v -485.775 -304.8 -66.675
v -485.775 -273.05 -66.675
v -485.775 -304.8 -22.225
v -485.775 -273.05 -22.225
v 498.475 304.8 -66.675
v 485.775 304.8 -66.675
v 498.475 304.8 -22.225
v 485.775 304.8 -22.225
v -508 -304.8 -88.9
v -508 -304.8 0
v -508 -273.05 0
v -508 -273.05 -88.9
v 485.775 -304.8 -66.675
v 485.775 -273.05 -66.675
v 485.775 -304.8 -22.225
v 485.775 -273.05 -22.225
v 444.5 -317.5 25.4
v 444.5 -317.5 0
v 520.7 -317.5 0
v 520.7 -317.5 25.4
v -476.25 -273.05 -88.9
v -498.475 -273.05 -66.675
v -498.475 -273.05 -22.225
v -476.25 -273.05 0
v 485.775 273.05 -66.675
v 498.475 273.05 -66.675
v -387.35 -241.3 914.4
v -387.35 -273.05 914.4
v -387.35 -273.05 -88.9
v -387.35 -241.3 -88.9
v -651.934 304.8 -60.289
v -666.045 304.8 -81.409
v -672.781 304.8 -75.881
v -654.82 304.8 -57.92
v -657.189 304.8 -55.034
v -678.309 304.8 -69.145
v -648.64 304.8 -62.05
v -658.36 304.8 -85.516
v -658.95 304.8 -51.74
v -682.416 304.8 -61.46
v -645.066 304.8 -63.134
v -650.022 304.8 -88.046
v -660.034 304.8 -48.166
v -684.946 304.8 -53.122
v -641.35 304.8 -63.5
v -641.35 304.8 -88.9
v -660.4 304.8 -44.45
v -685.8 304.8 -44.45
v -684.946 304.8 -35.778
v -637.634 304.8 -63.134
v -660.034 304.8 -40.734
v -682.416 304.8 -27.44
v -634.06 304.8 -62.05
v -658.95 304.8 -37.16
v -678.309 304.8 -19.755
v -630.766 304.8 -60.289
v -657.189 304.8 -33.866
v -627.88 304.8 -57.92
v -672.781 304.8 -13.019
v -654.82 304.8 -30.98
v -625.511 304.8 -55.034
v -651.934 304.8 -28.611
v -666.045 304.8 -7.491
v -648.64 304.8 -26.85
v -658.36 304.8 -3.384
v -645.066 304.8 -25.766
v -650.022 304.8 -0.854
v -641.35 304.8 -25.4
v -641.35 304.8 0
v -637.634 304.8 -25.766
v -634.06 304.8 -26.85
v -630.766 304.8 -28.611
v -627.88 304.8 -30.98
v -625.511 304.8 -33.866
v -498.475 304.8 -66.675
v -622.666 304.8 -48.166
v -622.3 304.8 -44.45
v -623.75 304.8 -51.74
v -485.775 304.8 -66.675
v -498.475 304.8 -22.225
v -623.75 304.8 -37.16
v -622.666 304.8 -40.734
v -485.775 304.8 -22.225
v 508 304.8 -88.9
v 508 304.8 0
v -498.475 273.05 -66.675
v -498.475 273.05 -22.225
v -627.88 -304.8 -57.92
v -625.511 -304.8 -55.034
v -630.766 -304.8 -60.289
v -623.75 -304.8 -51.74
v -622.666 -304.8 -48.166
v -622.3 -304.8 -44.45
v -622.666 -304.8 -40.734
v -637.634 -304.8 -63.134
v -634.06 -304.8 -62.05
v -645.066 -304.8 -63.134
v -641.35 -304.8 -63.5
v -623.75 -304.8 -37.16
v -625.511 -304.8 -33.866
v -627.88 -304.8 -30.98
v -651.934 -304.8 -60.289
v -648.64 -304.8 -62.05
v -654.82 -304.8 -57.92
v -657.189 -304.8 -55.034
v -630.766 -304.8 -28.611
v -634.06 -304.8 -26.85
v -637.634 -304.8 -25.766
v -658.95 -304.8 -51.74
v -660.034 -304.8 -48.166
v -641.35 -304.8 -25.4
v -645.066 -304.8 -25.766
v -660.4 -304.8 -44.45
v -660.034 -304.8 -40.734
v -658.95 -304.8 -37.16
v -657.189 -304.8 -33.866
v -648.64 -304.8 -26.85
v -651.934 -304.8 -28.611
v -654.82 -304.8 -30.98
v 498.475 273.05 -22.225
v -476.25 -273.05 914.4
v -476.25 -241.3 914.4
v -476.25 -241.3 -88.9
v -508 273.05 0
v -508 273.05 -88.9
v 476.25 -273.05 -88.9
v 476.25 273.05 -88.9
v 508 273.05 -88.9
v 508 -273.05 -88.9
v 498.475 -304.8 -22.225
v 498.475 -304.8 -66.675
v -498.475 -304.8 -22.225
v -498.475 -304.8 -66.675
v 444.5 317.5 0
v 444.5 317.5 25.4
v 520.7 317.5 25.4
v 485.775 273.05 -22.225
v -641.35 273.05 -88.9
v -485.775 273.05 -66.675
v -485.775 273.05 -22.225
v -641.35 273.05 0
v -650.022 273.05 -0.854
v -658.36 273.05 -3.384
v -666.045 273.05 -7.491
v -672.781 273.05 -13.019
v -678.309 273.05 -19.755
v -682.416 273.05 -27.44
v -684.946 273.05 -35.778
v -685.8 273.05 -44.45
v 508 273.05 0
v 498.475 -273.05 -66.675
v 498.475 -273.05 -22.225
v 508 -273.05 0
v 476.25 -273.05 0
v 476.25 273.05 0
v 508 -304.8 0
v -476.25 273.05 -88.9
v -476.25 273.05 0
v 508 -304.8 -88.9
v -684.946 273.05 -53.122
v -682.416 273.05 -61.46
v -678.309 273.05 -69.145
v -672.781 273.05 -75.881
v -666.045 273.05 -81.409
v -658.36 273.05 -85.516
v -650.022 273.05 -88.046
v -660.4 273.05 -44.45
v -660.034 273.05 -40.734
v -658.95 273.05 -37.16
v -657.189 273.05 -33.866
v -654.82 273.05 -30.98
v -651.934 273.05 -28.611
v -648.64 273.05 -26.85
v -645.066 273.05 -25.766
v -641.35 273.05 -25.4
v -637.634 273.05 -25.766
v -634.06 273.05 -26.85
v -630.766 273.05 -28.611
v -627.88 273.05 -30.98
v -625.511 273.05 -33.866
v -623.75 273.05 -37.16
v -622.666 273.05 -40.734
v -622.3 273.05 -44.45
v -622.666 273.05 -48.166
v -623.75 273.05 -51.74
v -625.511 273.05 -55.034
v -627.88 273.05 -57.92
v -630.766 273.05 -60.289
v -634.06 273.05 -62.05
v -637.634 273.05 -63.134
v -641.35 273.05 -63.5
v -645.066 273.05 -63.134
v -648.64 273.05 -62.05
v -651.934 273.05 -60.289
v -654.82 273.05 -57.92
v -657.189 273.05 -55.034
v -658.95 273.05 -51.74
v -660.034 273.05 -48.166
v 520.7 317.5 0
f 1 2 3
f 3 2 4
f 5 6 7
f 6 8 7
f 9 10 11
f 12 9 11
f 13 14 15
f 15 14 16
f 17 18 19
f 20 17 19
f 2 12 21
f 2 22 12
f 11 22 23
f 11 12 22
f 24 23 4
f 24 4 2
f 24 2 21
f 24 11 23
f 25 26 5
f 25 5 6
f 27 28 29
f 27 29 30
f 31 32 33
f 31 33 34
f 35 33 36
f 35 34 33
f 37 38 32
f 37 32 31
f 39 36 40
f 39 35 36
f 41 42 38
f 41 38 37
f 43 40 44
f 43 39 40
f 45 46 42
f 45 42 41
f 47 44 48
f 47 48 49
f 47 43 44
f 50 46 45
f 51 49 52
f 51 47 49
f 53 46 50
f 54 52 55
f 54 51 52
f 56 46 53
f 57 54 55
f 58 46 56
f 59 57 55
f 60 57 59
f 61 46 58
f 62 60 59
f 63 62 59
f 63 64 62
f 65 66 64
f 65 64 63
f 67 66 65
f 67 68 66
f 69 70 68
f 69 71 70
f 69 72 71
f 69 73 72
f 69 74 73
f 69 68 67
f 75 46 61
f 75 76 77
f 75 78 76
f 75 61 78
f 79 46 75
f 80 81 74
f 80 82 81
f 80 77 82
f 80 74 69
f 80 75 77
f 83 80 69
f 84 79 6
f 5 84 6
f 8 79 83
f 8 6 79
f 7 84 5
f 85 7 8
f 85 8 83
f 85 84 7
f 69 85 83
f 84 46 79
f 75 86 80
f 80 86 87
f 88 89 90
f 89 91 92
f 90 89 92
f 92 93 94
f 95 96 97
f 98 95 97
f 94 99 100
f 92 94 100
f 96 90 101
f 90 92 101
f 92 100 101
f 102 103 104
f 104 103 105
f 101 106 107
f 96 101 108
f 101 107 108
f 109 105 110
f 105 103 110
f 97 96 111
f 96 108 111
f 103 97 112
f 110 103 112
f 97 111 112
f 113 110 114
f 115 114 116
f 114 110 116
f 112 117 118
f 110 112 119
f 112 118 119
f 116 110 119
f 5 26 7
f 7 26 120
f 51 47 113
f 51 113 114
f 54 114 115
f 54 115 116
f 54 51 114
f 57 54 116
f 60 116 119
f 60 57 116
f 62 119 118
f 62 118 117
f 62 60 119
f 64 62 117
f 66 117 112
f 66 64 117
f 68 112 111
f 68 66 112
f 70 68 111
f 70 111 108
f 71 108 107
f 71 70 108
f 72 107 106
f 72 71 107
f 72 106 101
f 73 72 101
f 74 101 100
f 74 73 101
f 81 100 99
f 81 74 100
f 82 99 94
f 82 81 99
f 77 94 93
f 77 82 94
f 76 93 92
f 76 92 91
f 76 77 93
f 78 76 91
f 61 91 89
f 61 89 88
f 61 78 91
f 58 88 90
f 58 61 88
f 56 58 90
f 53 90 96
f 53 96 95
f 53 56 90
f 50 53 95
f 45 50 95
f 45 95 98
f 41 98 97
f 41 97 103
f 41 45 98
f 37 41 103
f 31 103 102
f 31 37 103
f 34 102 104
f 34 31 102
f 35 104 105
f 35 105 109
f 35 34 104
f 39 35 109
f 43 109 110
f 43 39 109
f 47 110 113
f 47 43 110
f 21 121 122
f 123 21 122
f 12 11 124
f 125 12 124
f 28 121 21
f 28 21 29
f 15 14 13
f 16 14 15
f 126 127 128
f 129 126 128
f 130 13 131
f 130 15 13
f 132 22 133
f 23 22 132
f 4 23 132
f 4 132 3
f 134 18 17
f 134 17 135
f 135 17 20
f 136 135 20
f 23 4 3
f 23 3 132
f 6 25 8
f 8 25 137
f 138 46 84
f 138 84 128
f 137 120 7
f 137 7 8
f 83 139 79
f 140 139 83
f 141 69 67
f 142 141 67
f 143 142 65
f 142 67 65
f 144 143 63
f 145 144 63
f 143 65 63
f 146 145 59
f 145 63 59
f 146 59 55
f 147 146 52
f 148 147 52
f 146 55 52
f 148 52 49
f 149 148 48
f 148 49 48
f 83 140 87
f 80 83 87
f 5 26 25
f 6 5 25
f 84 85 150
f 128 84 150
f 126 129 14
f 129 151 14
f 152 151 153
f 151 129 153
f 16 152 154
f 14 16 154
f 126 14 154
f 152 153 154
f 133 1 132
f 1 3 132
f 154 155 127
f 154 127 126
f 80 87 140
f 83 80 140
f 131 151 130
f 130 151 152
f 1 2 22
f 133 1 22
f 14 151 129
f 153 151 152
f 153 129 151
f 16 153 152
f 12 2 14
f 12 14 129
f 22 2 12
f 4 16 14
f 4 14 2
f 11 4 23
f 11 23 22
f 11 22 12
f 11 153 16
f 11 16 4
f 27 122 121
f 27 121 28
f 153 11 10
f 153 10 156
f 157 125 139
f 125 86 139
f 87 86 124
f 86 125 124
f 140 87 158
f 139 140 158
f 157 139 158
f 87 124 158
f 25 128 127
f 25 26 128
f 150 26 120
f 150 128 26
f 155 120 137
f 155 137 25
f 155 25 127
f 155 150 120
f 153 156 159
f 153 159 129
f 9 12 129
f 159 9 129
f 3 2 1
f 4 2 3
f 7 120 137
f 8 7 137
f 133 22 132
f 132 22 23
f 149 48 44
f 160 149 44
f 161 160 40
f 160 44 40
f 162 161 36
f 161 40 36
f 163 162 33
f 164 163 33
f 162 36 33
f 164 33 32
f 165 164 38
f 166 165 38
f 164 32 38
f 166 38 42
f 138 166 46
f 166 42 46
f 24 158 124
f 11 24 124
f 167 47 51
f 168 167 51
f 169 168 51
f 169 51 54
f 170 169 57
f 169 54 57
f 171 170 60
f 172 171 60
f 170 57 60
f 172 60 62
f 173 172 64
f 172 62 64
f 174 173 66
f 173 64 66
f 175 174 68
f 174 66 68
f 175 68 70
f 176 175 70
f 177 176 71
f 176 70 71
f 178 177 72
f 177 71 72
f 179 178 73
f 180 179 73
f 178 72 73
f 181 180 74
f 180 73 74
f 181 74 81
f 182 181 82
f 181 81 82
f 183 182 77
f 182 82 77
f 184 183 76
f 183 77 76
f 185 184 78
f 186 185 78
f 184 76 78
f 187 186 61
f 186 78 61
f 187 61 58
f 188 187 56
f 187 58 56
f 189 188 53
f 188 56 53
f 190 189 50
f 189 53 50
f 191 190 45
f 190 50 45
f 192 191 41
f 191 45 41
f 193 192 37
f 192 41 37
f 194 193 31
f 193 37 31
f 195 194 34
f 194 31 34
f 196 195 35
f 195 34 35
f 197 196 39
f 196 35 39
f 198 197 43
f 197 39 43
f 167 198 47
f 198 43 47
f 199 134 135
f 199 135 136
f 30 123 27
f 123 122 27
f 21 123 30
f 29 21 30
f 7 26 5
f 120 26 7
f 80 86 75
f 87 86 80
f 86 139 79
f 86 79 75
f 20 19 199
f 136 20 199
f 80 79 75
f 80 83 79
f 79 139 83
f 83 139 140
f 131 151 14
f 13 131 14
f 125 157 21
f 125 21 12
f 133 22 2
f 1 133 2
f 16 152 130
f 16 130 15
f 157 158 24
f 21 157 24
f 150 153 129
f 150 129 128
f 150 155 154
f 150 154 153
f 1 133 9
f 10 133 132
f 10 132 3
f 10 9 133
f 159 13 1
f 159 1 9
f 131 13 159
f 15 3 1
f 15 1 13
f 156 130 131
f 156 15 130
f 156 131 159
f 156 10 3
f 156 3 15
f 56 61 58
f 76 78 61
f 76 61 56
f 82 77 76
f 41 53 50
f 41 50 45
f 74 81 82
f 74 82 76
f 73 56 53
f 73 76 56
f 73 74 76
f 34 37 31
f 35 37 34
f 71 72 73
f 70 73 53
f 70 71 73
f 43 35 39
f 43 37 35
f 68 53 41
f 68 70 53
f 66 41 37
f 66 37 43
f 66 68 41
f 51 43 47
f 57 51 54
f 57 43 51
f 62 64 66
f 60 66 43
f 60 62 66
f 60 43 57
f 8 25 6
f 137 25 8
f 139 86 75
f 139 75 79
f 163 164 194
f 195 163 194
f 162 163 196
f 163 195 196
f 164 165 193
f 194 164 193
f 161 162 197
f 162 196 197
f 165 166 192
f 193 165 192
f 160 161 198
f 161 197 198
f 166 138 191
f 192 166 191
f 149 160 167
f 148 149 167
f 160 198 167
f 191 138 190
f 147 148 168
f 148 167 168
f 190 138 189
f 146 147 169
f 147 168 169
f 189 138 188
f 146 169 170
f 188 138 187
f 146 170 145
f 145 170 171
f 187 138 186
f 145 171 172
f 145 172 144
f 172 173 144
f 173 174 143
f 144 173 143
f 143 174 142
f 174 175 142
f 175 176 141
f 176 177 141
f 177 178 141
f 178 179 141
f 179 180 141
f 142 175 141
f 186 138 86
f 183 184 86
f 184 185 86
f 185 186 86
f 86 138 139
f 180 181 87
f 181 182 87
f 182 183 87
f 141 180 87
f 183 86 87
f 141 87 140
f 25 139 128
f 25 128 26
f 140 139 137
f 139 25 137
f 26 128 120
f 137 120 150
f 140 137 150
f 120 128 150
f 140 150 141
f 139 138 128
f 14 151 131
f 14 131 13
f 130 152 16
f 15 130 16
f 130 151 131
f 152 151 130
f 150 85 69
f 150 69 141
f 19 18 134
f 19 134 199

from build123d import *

# Parameters (mm, degrees)
F0_W          = 31.75
F0_H          = 31.75
F0_W_2        = 952.5
F1_DEPTH      = 88.9
F2_W          = 12.7
F2_H          = 44.45
F3_DEPTH      = 31.75
F0_H_2        = 546.1
F5_DEPTH      = 88.9
F8_W          = 88.9
F8_H          = 31.75
F9_DEPTH      = 914.4
F9_DEPTH_BACK = 88.9
F10_W         = 31.75
F10_H         = 88.9
F11_DEPTH     = 177.8
F12_R         = 19.05
F13_DEPTH     = 31.75
F14_DEPTH     = 609.6
F15_W         = 76.2
F15_H         = 635
F16_DEPTH     = 25.4


with BuildPart() as f1:
    # F0 (on Top) → F1 (new body)
    with BuildSketch(Plane.XY):
        with Locations((-492.125, -288.925)):
            Rectangle(F0_W, F0_H)
        with Locations((0, -288.925)):
            Rectangle(F0_W_2, F0_H)
        with Locations((492.125, -288.925)):
            Rectangle(F0_W, F0_H)
    extrude(amount=-F1_DEPTH)

    # F2 (on face) → F3 (cut, through all)
    with BuildSketch(Plane(origin=(0, -273.05, 0), x_dir=(-1, 0, 0), z_dir=(0, 1, 0))):
        with Locations((-492.125, -44.45)):
            Rectangle(F2_W, F2_H)
        with Locations((492.125, -44.45)):
            Rectangle(F2_W, F2_H)
    extrude(amount=-F3_DEPTH, mode=Mode.SUBTRACT)


with BuildPart() as f4_1:
    # F4: instance of F1
    add(f1.part.mirror(Plane.XZ))


with BuildPart() as f5:
    # F0 (on Top) → F5 (new body, through all)
    with BuildSketch(Plane.XY):
        with Locations((492.125, 288.925)):
            Rectangle(F0_W, F0_H)
        with Locations((492.125, 0)):
            Rectangle(F0_W, F0_H_2)
        with Locations((492.125, -288.925)):
            Rectangle(F0_W, F0_H)
    extrude(amount=-F5_DEPTH)

    # F6: cut F1, F4_1
    add(f1.part, mode=Mode.SUBTRACT)
    add(f4_1.part, mode=Mode.SUBTRACT)


with BuildPart() as f7_1:
    # F7: instance of F5
    add(f5.part.mirror(Plane.YZ))


with BuildPart() as f9:
    # F8 (on face) → F9 (new body, two sides)
    with BuildSketch(Plane.XY) as f9_sk:
        with Locations((-431.8, -257.175)):
            Rectangle(F8_W, F8_H)
    extrude(amount=F9_DEPTH)
    extrude(f9_sk.sketch, amount=-F9_DEPTH_BACK)


with BuildPart() as f4_1_1:
    add(f4_1.part)

    # F10 (on face) → F11 (join)
    with BuildSketch(Plane(origin=(-508, 0, 0), x_dir=(0, -1, 0), z_dir=(-1, 0, 0))):
        with Locations((-288.925, -44.45)):
            Rectangle(F10_W, F10_H)
    extrude(amount=F11_DEPTH)

    # F12 (on face) → F13 (cut, through all)
    with BuildSketch(Plane(origin=(0, 304.8, 0), x_dir=(-1, 0, 0), z_dir=(0, 1, 0))):
        with BuildLine():
            Line((641.35, -88.9), (685.8, -88.9))
            Line((685.8, -88.9), (685.8, -44.45))
            ThreePointArc((685.8, -44.45), (672.7808964237, -75.8808964237), (641.35, -88.9))
        make_face()
        with BuildLine():
            ThreePointArc((641.35, 0), (672.7808964237, -13.0191035763), (685.8, -44.45))
            Line((685.8, -44.45), (685.8, 0))
            Line((685.8, 0), (641.35, 0))
        make_face()
        with Locations((641.35, -44.45)):
            Circle(F12_R)
    extrude(amount=-F13_DEPTH, mode=Mode.SUBTRACT)


with BuildPart() as f14:
    # F12 (on face) → F14 (new body, through all)
    with BuildSketch(Plane(origin=(0, 304.8, 0), x_dir=(-1, 0, 0), z_dir=(0, 1, 0))):
        with Locations((641.35, -44.45)):
            Circle(F12_R)
    extrude(amount=-F14_DEPTH)


with BuildPart() as f16:
    # F15 (on Top) → F16 (new body)
    with BuildSketch(Plane.XY):
        with Locations((482.6, 0)):
            Rectangle(F15_W, F15_H)
    extrude(amount=F16_DEPTH)


solid = Compound([f1.part, f5.part, f7_1.part, f9.part, f4_1_1.part, f14.part, f16.part])
